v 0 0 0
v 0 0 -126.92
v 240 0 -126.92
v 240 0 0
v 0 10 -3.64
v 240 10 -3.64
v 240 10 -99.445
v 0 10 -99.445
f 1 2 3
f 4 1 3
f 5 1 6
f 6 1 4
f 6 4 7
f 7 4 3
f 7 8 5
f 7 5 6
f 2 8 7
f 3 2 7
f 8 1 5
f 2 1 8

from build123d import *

# Parameters (mm, degrees)
SKETCH1_W           = 240
SKETCH1_H           = 126.92
BOSS_EXTRUDE1_DEPTH = 10
CHAMFER1_SIZE2      = 27.474774195
CHAMFER1_SIZE       = 10
CHAMFER3_SIZE2      = 10
CHAMFER3_SIZE       = 3.639702343


with BuildPart() as part:
    # Sketch1 → Boss-Extrude1 (new body)
    with BuildSketch(Plane(origin=(0, 0, 0), x_dir=(1, 0, 0), z_dir=(0, 1, 0))):
        with Locations((120, 63.46)):
            Rectangle(SKETCH1_W, SKETCH1_H)
    extrude(amount=BOSS_EXTRUDE1_DEPTH)

    # Chamfer1
    chamfer1_edges = [part.edges().sort_by_distance(p)[0] for p in [
        (120, 10, -126.92),
    ]]
    chamfer1_side = [part.faces().sort_by_distance(p)[0] for p in [
        (120, 9.8, -126.92),
    ]]
    chamfer(chamfer1_edges, length=CHAMFER1_SIZE - 0.0001, length2=CHAMFER1_SIZE2 - 0.0001, reference=chamfer1_side[0])  # a hair under: the kernel refuses the full size

    # Chamfer3
    chamfer3_edges = [part.edges().sort_by_distance(p)[0] for p in [
        (120, 10, 0),
    ]]
    chamfer3_side = [part.faces().sort_by_distance(p)[0] for p in [
        (120, 10, -0.072794047),
    ]]
    chamfer(chamfer3_edges, length=CHAMFER3_SIZE - 0.0001, length2=CHAMFER3_SIZE2 - 0.0001, reference=chamfer3_side[0])  # a hair under: the kernel refuses the full size


solid = part.part
